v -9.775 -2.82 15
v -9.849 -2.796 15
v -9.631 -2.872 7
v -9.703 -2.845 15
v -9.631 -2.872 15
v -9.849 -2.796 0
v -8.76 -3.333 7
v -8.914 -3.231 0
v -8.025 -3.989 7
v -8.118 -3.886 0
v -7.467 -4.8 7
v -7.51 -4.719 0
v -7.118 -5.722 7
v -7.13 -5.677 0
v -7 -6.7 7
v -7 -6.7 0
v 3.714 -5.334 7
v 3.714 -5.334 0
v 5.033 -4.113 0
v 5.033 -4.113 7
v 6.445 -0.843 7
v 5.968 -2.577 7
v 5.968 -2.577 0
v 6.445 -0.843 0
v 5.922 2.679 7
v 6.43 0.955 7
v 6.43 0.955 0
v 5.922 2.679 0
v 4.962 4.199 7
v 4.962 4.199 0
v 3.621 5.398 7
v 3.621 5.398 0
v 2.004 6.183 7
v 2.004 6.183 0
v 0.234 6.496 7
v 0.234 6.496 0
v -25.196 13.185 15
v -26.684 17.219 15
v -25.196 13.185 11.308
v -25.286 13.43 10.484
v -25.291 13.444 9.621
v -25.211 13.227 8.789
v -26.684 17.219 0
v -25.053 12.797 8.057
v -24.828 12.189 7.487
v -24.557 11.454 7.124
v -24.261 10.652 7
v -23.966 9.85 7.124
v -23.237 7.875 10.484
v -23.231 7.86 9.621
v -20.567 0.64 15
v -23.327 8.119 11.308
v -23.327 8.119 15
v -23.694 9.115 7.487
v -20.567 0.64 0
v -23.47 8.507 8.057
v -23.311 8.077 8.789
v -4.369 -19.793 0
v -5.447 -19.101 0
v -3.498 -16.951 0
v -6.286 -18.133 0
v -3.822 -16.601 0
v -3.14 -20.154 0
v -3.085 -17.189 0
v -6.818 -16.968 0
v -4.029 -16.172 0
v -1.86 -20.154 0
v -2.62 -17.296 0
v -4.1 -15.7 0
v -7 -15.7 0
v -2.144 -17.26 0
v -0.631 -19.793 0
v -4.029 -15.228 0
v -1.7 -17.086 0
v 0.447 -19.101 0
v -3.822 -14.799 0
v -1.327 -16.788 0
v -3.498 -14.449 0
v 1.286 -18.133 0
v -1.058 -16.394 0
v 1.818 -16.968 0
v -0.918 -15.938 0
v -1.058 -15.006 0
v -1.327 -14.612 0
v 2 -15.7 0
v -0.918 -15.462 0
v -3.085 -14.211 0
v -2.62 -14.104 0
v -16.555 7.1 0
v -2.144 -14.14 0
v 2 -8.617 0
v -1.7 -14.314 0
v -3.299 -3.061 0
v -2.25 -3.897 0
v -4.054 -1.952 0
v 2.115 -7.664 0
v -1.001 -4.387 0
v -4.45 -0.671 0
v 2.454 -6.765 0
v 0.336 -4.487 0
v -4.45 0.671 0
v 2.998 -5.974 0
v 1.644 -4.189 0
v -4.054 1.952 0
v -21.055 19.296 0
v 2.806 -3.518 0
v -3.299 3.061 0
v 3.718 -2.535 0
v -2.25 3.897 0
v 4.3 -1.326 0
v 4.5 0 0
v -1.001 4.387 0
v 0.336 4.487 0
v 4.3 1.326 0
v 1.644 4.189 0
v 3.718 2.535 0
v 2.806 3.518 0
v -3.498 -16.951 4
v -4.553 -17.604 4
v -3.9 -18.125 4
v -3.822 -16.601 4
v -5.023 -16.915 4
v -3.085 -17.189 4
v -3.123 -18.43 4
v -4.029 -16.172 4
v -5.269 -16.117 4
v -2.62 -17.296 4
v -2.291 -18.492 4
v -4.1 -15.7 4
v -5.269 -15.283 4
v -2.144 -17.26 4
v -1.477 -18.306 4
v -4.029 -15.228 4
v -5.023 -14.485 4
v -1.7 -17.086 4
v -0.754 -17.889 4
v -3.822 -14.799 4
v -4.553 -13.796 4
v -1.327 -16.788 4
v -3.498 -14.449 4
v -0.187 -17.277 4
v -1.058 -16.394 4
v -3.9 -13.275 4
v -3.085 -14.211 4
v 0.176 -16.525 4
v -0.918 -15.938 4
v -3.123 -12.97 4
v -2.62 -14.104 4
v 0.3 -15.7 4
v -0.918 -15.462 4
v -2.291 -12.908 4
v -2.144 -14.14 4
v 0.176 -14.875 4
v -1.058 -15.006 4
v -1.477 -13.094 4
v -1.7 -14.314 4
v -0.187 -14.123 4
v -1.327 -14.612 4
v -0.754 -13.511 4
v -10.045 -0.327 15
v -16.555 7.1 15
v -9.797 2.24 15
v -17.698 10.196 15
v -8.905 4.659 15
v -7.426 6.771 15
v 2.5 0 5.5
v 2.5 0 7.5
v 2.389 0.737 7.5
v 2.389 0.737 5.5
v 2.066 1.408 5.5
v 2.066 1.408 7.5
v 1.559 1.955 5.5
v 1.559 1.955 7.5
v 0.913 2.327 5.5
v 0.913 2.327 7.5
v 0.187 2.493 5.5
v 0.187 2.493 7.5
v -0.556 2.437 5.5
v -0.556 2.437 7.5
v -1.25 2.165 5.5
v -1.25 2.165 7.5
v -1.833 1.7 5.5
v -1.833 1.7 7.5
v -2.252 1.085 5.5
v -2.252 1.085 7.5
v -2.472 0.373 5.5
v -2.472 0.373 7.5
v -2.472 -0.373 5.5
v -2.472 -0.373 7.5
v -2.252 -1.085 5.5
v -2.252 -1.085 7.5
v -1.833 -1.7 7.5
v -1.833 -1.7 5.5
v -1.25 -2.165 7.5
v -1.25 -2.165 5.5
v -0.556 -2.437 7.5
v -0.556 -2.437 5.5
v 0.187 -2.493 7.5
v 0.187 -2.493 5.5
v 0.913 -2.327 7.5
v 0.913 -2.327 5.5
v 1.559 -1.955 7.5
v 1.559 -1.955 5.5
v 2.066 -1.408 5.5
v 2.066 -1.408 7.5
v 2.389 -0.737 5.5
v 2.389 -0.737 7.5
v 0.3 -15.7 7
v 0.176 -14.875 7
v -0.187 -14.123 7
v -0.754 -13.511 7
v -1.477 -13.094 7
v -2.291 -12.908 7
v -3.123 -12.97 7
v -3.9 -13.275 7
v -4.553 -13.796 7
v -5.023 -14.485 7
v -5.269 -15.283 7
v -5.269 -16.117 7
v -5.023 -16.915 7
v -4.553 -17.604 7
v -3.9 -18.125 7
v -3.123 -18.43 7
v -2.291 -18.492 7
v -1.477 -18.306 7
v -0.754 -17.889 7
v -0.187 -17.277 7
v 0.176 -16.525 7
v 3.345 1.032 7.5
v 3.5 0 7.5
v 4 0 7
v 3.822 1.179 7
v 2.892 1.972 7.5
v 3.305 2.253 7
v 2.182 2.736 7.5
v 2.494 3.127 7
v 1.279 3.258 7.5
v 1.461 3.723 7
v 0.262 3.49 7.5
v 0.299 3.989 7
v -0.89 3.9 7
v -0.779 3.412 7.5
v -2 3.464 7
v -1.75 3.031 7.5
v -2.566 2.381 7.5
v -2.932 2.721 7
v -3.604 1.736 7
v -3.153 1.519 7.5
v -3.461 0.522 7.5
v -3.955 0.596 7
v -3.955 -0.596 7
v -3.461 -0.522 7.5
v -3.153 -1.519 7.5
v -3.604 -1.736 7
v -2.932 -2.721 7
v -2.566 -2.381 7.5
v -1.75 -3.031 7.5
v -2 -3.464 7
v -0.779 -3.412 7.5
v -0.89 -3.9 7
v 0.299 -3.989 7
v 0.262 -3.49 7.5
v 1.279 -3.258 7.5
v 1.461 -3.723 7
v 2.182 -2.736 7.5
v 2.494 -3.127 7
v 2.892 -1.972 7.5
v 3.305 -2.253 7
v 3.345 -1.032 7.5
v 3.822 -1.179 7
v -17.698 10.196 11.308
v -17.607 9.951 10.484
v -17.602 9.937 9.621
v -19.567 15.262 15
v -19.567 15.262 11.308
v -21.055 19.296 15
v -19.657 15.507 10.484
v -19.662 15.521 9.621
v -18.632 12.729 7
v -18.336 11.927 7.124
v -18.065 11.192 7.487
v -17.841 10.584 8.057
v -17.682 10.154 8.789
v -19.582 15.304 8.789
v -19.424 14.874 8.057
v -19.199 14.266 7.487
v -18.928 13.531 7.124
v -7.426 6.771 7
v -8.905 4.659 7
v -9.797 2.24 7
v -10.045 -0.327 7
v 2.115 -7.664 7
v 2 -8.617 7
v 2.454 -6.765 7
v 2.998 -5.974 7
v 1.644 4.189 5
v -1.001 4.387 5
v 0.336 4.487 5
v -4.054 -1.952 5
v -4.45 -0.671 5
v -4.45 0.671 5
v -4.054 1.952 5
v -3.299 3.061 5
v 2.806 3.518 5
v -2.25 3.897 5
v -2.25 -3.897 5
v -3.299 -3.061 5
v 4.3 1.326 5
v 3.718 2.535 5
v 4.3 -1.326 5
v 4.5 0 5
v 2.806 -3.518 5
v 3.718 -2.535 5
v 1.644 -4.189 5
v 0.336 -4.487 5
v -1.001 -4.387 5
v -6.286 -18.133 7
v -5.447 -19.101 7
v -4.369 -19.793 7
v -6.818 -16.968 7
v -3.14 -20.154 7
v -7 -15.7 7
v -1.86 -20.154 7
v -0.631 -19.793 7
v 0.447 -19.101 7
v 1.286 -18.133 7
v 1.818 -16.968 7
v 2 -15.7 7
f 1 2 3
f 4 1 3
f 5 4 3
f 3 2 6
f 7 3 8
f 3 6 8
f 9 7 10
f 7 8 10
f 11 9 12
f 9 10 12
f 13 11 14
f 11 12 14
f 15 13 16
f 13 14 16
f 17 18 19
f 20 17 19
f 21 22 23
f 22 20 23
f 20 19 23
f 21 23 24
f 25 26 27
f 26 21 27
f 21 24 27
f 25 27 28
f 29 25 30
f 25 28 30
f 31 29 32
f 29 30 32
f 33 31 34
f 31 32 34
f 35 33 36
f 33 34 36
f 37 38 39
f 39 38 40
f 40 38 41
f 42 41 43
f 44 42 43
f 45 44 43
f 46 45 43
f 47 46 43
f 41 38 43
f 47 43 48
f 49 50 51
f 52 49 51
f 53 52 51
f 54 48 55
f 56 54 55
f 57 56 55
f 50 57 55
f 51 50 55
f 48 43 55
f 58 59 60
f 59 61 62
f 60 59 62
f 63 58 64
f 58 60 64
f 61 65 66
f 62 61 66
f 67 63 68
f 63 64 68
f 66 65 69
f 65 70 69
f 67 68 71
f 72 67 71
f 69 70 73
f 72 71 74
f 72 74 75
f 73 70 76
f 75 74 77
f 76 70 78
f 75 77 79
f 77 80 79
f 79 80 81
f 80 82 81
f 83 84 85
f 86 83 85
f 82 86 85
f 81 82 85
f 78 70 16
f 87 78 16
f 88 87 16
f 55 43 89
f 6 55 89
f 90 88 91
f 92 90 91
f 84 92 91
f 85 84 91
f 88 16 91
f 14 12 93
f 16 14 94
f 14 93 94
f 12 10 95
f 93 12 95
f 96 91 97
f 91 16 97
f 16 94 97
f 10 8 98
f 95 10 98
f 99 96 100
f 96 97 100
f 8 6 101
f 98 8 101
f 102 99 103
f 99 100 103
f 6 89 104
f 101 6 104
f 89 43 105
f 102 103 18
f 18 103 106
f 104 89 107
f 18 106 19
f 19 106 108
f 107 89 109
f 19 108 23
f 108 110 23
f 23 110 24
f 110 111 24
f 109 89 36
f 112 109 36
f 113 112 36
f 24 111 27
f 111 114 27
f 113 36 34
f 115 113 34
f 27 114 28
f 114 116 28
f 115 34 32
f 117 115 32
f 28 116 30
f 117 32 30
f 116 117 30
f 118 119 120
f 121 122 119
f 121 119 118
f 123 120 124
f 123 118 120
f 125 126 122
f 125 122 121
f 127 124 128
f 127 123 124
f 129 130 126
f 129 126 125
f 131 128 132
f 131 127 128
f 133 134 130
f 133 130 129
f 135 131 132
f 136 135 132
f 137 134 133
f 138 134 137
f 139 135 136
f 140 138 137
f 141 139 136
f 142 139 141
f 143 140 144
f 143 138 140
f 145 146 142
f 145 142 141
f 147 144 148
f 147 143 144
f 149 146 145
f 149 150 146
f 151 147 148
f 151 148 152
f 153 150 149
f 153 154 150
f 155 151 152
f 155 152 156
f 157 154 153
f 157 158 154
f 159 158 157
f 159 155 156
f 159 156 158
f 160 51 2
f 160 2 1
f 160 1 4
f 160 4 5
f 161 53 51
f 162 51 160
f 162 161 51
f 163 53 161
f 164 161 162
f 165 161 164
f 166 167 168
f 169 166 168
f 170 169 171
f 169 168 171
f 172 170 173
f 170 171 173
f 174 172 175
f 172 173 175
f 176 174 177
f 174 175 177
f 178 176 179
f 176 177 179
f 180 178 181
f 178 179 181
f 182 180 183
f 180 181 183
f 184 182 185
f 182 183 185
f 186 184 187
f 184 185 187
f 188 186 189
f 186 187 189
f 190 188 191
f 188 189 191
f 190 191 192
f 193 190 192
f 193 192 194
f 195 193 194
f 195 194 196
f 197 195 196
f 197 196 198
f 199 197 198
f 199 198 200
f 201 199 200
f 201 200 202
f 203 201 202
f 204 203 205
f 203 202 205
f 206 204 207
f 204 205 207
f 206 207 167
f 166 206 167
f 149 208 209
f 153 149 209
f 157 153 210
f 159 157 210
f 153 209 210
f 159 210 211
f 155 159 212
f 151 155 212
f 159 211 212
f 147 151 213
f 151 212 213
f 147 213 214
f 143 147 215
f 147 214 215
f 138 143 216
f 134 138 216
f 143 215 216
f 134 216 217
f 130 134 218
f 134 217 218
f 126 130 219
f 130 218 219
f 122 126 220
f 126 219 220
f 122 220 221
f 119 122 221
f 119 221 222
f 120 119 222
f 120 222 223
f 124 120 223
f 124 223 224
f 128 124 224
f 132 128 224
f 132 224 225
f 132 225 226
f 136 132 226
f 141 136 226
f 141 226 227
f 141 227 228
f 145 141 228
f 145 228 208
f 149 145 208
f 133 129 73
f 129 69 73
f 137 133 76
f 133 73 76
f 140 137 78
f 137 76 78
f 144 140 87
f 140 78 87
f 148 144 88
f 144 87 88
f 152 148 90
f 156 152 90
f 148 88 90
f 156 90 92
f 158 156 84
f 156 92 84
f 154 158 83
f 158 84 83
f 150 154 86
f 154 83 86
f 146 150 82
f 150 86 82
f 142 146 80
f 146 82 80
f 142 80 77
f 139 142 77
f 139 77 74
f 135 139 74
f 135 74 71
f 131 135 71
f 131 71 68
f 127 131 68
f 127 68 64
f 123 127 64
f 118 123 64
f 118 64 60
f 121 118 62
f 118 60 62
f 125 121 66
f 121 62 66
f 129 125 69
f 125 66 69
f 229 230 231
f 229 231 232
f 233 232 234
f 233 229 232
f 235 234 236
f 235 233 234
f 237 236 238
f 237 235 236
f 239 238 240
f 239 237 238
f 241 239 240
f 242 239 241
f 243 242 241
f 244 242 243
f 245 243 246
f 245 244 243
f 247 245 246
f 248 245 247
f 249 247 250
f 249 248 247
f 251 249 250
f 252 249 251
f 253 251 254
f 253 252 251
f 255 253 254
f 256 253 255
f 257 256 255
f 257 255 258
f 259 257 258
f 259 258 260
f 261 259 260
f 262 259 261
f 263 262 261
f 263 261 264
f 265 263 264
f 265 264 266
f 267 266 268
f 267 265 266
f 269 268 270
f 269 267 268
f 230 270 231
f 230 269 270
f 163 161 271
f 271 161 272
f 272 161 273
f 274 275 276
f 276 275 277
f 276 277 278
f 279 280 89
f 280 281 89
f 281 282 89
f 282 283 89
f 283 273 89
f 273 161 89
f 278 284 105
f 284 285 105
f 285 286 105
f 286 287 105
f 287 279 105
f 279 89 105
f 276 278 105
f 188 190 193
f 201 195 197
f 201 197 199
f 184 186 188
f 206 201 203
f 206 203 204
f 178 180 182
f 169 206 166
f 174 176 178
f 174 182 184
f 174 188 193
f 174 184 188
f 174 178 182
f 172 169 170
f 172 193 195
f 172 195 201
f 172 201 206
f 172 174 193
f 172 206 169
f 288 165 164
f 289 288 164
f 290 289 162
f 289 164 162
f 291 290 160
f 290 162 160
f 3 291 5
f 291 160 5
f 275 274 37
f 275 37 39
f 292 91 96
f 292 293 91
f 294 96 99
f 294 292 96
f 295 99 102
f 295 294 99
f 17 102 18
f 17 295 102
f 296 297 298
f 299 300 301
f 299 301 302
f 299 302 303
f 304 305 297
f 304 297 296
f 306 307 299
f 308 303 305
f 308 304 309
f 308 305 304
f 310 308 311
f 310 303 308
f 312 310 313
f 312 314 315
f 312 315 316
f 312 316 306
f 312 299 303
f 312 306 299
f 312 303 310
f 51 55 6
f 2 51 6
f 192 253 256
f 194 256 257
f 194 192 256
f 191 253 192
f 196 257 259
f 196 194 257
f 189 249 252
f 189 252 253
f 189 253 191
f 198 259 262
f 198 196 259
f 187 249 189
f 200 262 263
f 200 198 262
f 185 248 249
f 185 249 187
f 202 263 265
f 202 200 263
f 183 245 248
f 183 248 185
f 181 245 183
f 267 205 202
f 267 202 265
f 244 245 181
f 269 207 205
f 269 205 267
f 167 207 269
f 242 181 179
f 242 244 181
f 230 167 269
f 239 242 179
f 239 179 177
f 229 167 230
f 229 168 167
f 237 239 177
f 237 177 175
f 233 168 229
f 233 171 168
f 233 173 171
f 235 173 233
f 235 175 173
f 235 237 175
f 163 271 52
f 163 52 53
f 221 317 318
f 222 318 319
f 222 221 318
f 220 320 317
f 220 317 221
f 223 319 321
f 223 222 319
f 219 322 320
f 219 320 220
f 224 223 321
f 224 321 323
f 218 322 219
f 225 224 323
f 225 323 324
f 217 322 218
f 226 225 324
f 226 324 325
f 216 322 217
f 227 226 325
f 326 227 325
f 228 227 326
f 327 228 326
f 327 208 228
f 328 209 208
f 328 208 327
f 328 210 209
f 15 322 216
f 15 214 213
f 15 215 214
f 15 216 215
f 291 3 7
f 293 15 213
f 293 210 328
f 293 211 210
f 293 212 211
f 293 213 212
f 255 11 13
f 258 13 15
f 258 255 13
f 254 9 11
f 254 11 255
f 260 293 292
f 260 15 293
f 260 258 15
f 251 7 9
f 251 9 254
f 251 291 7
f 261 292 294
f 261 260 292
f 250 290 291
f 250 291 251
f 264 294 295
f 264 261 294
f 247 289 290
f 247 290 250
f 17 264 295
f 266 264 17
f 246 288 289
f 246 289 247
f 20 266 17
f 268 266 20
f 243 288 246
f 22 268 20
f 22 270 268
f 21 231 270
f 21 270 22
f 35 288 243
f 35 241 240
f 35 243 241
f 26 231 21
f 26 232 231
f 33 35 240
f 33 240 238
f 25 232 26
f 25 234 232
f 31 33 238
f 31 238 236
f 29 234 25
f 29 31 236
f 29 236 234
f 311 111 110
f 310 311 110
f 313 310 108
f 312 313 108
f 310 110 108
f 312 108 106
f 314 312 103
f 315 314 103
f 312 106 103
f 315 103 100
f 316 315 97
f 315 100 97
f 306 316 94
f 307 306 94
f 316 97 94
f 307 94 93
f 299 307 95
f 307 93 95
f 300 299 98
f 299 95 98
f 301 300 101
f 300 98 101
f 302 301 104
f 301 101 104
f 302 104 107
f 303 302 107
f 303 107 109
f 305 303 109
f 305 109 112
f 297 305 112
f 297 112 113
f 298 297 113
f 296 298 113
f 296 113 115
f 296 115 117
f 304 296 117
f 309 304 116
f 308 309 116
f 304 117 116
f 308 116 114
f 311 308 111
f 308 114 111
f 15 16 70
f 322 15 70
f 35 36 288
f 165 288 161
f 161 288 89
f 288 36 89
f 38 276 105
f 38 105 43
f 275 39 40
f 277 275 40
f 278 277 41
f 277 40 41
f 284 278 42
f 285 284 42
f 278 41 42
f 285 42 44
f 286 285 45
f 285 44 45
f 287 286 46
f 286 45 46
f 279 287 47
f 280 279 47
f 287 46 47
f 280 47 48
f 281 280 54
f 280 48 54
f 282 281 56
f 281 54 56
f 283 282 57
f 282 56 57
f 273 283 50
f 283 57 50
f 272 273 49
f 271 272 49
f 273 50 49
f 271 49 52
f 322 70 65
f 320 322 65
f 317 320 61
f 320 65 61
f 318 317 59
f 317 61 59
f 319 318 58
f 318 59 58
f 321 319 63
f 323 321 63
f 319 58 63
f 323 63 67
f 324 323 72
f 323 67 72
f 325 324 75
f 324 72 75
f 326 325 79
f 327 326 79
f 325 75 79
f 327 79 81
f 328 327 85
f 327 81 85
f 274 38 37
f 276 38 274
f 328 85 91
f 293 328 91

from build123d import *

# Parameters (mm, degrees)
F1_DEPTH       = 15
F3_DEPTH       = 8
F5_D           = 3.2
F5_CBORE_D     = 5.6
F5_CBORE_DEPTH = 3
F6_R           = 4.5
F7_DEPTH       = 5
F8_R           = 4
F9_DEPTH       = 0.5
F10_R          = 2.5
F11_DEPTH      = 2
F12_SIZE       = 0.49999
F14_DEPTH      = 6
F15_R          = 4


# Not quite as in the source:
# - a fillet or chamfer is up to 0.001 mm smaller than in the source, because OpenCascade refuses the exact size


with BuildPart() as f1:
    # F0 (on Top) → F1 (new body)
    with BuildSketch(Plane.XY):
        with BuildLine():
            Line((2, -15.7), (2, -6.1846584384))
            ThreePointArc((2, -6.1846584384), (6.437849506, 0.8967127402), (0.2337698218, 6.4957949221))
            Line((0.2337698218, 6.4957949221), (-16.5553616693, 7.1))
            Line((-16.5553616693, 7.1), (-21.0553616693, 19.2963109177))
            Line((-21.0553616693, 19.2963109177), (-26.6844282466, 17.2193878407))
            Line((-26.6844282466, 17.2193878407), (-20.5672701971, 0.6401075063))
            Line((-20.5672701971, 0.6401075063), (-9.8485109145, -2.7956722641))
            ThreePointArc((-9.8485109145, -2.7956722641), (-7.7878175435, -4.283505147), (-7, -6.7))
            Line((-7, -6.7), (-7, -15.7))
            ThreePointArc((-7, -15.7), (-2.5, -20.2), (2, -15.7))
        make_face()
    extrude(amount=F1_DEPTH)

    # F2 (on face) → F3 (cut)
    with BuildSketch(Plane.XY.offset(15)):
        with BuildLine():
            Line((2, -15.7), (2, -9.8489847192))
            ThreePointArc((2, -9.8489847192), (2.8265485956, 9.6443311347), (-7, -7.2112758927))
            Line((-7, -7.2112758927), (-7, -15.7))
            ThreePointArc((-7, -15.7), (-2.5, -20.2), (2, -15.7))
        make_face()
    extrude(amount=-F3_DEPTH, mode=Mode.SUBTRACT)

    # F5 (through all)
    with Locations(Plane.XY.offset(7)):
        with Locations((-2.5, -15.7)):
            CounterBoreHole(F5_D / 2, F5_CBORE_D / 2, F5_CBORE_DEPTH)

    # F6 (on face) → F7 (cut)
    with BuildSketch(Plane(origin=(0, 0, 0), x_dir=(1, 0, 0), z_dir=(0, 0, -1))):
        Circle(F6_R)
    extrude(amount=-F7_DEPTH, mode=Mode.SUBTRACT)

    # F8 (on face) → F9 (join)
    with BuildSketch(Plane.XY.offset(7)):
        Circle(F8_R)
    extrude(amount=F9_DEPTH)

    # F10 (on face) → F11 (cut)
    with BuildSketch(Plane.XY.offset(7.5)):
        Circle(F10_R)
    extrude(amount=-F11_DEPTH, mode=Mode.SUBTRACT)

    # F12 (size 0.5 in the source; OpenCascade refuses exactly that, so slightly less here)
    f12_edges = [f1.edges().sort_by_distance(p)[0] for p in [
        (-4, 0, 7.5),
    ]]
    chamfer(f12_edges, length=F12_SIZE)

    # F13 (on face) → F14 (cut, through all)
    with BuildSketch(Plane(origin=(-17.8949713968, -6.6026007232, 0), x_dir=(0.3461538462, -0.9381777629, 0), z_dir=(-0.9381777629, -0.3461538462, 0))):
        with BuildLine():
            Line((-15.6917642328, 15), (-21.0917642328, 15))
            Line((-21.0917642328, 15), (-21.0917642328, 11.3076696831))
            ThreePointArc((-21.0917642328, 11.3076696831), (-18.3917642328, 7), (-15.6917642328, 11.3076696831))
            Line((-15.6917642328, 11.3076696831), (-15.6917642328, 15))
        make_face()
    extrude(amount=-F14_DEPTH, mode=Mode.SUBTRACT)

    # F15
    f15_edges = [f1.edges().sort_by_distance(p)[0] for p in [
        (2, -6.184658, 3.5),
    ]]
    fillet(f15_edges, radius=F15_R)


solid = f1.part
